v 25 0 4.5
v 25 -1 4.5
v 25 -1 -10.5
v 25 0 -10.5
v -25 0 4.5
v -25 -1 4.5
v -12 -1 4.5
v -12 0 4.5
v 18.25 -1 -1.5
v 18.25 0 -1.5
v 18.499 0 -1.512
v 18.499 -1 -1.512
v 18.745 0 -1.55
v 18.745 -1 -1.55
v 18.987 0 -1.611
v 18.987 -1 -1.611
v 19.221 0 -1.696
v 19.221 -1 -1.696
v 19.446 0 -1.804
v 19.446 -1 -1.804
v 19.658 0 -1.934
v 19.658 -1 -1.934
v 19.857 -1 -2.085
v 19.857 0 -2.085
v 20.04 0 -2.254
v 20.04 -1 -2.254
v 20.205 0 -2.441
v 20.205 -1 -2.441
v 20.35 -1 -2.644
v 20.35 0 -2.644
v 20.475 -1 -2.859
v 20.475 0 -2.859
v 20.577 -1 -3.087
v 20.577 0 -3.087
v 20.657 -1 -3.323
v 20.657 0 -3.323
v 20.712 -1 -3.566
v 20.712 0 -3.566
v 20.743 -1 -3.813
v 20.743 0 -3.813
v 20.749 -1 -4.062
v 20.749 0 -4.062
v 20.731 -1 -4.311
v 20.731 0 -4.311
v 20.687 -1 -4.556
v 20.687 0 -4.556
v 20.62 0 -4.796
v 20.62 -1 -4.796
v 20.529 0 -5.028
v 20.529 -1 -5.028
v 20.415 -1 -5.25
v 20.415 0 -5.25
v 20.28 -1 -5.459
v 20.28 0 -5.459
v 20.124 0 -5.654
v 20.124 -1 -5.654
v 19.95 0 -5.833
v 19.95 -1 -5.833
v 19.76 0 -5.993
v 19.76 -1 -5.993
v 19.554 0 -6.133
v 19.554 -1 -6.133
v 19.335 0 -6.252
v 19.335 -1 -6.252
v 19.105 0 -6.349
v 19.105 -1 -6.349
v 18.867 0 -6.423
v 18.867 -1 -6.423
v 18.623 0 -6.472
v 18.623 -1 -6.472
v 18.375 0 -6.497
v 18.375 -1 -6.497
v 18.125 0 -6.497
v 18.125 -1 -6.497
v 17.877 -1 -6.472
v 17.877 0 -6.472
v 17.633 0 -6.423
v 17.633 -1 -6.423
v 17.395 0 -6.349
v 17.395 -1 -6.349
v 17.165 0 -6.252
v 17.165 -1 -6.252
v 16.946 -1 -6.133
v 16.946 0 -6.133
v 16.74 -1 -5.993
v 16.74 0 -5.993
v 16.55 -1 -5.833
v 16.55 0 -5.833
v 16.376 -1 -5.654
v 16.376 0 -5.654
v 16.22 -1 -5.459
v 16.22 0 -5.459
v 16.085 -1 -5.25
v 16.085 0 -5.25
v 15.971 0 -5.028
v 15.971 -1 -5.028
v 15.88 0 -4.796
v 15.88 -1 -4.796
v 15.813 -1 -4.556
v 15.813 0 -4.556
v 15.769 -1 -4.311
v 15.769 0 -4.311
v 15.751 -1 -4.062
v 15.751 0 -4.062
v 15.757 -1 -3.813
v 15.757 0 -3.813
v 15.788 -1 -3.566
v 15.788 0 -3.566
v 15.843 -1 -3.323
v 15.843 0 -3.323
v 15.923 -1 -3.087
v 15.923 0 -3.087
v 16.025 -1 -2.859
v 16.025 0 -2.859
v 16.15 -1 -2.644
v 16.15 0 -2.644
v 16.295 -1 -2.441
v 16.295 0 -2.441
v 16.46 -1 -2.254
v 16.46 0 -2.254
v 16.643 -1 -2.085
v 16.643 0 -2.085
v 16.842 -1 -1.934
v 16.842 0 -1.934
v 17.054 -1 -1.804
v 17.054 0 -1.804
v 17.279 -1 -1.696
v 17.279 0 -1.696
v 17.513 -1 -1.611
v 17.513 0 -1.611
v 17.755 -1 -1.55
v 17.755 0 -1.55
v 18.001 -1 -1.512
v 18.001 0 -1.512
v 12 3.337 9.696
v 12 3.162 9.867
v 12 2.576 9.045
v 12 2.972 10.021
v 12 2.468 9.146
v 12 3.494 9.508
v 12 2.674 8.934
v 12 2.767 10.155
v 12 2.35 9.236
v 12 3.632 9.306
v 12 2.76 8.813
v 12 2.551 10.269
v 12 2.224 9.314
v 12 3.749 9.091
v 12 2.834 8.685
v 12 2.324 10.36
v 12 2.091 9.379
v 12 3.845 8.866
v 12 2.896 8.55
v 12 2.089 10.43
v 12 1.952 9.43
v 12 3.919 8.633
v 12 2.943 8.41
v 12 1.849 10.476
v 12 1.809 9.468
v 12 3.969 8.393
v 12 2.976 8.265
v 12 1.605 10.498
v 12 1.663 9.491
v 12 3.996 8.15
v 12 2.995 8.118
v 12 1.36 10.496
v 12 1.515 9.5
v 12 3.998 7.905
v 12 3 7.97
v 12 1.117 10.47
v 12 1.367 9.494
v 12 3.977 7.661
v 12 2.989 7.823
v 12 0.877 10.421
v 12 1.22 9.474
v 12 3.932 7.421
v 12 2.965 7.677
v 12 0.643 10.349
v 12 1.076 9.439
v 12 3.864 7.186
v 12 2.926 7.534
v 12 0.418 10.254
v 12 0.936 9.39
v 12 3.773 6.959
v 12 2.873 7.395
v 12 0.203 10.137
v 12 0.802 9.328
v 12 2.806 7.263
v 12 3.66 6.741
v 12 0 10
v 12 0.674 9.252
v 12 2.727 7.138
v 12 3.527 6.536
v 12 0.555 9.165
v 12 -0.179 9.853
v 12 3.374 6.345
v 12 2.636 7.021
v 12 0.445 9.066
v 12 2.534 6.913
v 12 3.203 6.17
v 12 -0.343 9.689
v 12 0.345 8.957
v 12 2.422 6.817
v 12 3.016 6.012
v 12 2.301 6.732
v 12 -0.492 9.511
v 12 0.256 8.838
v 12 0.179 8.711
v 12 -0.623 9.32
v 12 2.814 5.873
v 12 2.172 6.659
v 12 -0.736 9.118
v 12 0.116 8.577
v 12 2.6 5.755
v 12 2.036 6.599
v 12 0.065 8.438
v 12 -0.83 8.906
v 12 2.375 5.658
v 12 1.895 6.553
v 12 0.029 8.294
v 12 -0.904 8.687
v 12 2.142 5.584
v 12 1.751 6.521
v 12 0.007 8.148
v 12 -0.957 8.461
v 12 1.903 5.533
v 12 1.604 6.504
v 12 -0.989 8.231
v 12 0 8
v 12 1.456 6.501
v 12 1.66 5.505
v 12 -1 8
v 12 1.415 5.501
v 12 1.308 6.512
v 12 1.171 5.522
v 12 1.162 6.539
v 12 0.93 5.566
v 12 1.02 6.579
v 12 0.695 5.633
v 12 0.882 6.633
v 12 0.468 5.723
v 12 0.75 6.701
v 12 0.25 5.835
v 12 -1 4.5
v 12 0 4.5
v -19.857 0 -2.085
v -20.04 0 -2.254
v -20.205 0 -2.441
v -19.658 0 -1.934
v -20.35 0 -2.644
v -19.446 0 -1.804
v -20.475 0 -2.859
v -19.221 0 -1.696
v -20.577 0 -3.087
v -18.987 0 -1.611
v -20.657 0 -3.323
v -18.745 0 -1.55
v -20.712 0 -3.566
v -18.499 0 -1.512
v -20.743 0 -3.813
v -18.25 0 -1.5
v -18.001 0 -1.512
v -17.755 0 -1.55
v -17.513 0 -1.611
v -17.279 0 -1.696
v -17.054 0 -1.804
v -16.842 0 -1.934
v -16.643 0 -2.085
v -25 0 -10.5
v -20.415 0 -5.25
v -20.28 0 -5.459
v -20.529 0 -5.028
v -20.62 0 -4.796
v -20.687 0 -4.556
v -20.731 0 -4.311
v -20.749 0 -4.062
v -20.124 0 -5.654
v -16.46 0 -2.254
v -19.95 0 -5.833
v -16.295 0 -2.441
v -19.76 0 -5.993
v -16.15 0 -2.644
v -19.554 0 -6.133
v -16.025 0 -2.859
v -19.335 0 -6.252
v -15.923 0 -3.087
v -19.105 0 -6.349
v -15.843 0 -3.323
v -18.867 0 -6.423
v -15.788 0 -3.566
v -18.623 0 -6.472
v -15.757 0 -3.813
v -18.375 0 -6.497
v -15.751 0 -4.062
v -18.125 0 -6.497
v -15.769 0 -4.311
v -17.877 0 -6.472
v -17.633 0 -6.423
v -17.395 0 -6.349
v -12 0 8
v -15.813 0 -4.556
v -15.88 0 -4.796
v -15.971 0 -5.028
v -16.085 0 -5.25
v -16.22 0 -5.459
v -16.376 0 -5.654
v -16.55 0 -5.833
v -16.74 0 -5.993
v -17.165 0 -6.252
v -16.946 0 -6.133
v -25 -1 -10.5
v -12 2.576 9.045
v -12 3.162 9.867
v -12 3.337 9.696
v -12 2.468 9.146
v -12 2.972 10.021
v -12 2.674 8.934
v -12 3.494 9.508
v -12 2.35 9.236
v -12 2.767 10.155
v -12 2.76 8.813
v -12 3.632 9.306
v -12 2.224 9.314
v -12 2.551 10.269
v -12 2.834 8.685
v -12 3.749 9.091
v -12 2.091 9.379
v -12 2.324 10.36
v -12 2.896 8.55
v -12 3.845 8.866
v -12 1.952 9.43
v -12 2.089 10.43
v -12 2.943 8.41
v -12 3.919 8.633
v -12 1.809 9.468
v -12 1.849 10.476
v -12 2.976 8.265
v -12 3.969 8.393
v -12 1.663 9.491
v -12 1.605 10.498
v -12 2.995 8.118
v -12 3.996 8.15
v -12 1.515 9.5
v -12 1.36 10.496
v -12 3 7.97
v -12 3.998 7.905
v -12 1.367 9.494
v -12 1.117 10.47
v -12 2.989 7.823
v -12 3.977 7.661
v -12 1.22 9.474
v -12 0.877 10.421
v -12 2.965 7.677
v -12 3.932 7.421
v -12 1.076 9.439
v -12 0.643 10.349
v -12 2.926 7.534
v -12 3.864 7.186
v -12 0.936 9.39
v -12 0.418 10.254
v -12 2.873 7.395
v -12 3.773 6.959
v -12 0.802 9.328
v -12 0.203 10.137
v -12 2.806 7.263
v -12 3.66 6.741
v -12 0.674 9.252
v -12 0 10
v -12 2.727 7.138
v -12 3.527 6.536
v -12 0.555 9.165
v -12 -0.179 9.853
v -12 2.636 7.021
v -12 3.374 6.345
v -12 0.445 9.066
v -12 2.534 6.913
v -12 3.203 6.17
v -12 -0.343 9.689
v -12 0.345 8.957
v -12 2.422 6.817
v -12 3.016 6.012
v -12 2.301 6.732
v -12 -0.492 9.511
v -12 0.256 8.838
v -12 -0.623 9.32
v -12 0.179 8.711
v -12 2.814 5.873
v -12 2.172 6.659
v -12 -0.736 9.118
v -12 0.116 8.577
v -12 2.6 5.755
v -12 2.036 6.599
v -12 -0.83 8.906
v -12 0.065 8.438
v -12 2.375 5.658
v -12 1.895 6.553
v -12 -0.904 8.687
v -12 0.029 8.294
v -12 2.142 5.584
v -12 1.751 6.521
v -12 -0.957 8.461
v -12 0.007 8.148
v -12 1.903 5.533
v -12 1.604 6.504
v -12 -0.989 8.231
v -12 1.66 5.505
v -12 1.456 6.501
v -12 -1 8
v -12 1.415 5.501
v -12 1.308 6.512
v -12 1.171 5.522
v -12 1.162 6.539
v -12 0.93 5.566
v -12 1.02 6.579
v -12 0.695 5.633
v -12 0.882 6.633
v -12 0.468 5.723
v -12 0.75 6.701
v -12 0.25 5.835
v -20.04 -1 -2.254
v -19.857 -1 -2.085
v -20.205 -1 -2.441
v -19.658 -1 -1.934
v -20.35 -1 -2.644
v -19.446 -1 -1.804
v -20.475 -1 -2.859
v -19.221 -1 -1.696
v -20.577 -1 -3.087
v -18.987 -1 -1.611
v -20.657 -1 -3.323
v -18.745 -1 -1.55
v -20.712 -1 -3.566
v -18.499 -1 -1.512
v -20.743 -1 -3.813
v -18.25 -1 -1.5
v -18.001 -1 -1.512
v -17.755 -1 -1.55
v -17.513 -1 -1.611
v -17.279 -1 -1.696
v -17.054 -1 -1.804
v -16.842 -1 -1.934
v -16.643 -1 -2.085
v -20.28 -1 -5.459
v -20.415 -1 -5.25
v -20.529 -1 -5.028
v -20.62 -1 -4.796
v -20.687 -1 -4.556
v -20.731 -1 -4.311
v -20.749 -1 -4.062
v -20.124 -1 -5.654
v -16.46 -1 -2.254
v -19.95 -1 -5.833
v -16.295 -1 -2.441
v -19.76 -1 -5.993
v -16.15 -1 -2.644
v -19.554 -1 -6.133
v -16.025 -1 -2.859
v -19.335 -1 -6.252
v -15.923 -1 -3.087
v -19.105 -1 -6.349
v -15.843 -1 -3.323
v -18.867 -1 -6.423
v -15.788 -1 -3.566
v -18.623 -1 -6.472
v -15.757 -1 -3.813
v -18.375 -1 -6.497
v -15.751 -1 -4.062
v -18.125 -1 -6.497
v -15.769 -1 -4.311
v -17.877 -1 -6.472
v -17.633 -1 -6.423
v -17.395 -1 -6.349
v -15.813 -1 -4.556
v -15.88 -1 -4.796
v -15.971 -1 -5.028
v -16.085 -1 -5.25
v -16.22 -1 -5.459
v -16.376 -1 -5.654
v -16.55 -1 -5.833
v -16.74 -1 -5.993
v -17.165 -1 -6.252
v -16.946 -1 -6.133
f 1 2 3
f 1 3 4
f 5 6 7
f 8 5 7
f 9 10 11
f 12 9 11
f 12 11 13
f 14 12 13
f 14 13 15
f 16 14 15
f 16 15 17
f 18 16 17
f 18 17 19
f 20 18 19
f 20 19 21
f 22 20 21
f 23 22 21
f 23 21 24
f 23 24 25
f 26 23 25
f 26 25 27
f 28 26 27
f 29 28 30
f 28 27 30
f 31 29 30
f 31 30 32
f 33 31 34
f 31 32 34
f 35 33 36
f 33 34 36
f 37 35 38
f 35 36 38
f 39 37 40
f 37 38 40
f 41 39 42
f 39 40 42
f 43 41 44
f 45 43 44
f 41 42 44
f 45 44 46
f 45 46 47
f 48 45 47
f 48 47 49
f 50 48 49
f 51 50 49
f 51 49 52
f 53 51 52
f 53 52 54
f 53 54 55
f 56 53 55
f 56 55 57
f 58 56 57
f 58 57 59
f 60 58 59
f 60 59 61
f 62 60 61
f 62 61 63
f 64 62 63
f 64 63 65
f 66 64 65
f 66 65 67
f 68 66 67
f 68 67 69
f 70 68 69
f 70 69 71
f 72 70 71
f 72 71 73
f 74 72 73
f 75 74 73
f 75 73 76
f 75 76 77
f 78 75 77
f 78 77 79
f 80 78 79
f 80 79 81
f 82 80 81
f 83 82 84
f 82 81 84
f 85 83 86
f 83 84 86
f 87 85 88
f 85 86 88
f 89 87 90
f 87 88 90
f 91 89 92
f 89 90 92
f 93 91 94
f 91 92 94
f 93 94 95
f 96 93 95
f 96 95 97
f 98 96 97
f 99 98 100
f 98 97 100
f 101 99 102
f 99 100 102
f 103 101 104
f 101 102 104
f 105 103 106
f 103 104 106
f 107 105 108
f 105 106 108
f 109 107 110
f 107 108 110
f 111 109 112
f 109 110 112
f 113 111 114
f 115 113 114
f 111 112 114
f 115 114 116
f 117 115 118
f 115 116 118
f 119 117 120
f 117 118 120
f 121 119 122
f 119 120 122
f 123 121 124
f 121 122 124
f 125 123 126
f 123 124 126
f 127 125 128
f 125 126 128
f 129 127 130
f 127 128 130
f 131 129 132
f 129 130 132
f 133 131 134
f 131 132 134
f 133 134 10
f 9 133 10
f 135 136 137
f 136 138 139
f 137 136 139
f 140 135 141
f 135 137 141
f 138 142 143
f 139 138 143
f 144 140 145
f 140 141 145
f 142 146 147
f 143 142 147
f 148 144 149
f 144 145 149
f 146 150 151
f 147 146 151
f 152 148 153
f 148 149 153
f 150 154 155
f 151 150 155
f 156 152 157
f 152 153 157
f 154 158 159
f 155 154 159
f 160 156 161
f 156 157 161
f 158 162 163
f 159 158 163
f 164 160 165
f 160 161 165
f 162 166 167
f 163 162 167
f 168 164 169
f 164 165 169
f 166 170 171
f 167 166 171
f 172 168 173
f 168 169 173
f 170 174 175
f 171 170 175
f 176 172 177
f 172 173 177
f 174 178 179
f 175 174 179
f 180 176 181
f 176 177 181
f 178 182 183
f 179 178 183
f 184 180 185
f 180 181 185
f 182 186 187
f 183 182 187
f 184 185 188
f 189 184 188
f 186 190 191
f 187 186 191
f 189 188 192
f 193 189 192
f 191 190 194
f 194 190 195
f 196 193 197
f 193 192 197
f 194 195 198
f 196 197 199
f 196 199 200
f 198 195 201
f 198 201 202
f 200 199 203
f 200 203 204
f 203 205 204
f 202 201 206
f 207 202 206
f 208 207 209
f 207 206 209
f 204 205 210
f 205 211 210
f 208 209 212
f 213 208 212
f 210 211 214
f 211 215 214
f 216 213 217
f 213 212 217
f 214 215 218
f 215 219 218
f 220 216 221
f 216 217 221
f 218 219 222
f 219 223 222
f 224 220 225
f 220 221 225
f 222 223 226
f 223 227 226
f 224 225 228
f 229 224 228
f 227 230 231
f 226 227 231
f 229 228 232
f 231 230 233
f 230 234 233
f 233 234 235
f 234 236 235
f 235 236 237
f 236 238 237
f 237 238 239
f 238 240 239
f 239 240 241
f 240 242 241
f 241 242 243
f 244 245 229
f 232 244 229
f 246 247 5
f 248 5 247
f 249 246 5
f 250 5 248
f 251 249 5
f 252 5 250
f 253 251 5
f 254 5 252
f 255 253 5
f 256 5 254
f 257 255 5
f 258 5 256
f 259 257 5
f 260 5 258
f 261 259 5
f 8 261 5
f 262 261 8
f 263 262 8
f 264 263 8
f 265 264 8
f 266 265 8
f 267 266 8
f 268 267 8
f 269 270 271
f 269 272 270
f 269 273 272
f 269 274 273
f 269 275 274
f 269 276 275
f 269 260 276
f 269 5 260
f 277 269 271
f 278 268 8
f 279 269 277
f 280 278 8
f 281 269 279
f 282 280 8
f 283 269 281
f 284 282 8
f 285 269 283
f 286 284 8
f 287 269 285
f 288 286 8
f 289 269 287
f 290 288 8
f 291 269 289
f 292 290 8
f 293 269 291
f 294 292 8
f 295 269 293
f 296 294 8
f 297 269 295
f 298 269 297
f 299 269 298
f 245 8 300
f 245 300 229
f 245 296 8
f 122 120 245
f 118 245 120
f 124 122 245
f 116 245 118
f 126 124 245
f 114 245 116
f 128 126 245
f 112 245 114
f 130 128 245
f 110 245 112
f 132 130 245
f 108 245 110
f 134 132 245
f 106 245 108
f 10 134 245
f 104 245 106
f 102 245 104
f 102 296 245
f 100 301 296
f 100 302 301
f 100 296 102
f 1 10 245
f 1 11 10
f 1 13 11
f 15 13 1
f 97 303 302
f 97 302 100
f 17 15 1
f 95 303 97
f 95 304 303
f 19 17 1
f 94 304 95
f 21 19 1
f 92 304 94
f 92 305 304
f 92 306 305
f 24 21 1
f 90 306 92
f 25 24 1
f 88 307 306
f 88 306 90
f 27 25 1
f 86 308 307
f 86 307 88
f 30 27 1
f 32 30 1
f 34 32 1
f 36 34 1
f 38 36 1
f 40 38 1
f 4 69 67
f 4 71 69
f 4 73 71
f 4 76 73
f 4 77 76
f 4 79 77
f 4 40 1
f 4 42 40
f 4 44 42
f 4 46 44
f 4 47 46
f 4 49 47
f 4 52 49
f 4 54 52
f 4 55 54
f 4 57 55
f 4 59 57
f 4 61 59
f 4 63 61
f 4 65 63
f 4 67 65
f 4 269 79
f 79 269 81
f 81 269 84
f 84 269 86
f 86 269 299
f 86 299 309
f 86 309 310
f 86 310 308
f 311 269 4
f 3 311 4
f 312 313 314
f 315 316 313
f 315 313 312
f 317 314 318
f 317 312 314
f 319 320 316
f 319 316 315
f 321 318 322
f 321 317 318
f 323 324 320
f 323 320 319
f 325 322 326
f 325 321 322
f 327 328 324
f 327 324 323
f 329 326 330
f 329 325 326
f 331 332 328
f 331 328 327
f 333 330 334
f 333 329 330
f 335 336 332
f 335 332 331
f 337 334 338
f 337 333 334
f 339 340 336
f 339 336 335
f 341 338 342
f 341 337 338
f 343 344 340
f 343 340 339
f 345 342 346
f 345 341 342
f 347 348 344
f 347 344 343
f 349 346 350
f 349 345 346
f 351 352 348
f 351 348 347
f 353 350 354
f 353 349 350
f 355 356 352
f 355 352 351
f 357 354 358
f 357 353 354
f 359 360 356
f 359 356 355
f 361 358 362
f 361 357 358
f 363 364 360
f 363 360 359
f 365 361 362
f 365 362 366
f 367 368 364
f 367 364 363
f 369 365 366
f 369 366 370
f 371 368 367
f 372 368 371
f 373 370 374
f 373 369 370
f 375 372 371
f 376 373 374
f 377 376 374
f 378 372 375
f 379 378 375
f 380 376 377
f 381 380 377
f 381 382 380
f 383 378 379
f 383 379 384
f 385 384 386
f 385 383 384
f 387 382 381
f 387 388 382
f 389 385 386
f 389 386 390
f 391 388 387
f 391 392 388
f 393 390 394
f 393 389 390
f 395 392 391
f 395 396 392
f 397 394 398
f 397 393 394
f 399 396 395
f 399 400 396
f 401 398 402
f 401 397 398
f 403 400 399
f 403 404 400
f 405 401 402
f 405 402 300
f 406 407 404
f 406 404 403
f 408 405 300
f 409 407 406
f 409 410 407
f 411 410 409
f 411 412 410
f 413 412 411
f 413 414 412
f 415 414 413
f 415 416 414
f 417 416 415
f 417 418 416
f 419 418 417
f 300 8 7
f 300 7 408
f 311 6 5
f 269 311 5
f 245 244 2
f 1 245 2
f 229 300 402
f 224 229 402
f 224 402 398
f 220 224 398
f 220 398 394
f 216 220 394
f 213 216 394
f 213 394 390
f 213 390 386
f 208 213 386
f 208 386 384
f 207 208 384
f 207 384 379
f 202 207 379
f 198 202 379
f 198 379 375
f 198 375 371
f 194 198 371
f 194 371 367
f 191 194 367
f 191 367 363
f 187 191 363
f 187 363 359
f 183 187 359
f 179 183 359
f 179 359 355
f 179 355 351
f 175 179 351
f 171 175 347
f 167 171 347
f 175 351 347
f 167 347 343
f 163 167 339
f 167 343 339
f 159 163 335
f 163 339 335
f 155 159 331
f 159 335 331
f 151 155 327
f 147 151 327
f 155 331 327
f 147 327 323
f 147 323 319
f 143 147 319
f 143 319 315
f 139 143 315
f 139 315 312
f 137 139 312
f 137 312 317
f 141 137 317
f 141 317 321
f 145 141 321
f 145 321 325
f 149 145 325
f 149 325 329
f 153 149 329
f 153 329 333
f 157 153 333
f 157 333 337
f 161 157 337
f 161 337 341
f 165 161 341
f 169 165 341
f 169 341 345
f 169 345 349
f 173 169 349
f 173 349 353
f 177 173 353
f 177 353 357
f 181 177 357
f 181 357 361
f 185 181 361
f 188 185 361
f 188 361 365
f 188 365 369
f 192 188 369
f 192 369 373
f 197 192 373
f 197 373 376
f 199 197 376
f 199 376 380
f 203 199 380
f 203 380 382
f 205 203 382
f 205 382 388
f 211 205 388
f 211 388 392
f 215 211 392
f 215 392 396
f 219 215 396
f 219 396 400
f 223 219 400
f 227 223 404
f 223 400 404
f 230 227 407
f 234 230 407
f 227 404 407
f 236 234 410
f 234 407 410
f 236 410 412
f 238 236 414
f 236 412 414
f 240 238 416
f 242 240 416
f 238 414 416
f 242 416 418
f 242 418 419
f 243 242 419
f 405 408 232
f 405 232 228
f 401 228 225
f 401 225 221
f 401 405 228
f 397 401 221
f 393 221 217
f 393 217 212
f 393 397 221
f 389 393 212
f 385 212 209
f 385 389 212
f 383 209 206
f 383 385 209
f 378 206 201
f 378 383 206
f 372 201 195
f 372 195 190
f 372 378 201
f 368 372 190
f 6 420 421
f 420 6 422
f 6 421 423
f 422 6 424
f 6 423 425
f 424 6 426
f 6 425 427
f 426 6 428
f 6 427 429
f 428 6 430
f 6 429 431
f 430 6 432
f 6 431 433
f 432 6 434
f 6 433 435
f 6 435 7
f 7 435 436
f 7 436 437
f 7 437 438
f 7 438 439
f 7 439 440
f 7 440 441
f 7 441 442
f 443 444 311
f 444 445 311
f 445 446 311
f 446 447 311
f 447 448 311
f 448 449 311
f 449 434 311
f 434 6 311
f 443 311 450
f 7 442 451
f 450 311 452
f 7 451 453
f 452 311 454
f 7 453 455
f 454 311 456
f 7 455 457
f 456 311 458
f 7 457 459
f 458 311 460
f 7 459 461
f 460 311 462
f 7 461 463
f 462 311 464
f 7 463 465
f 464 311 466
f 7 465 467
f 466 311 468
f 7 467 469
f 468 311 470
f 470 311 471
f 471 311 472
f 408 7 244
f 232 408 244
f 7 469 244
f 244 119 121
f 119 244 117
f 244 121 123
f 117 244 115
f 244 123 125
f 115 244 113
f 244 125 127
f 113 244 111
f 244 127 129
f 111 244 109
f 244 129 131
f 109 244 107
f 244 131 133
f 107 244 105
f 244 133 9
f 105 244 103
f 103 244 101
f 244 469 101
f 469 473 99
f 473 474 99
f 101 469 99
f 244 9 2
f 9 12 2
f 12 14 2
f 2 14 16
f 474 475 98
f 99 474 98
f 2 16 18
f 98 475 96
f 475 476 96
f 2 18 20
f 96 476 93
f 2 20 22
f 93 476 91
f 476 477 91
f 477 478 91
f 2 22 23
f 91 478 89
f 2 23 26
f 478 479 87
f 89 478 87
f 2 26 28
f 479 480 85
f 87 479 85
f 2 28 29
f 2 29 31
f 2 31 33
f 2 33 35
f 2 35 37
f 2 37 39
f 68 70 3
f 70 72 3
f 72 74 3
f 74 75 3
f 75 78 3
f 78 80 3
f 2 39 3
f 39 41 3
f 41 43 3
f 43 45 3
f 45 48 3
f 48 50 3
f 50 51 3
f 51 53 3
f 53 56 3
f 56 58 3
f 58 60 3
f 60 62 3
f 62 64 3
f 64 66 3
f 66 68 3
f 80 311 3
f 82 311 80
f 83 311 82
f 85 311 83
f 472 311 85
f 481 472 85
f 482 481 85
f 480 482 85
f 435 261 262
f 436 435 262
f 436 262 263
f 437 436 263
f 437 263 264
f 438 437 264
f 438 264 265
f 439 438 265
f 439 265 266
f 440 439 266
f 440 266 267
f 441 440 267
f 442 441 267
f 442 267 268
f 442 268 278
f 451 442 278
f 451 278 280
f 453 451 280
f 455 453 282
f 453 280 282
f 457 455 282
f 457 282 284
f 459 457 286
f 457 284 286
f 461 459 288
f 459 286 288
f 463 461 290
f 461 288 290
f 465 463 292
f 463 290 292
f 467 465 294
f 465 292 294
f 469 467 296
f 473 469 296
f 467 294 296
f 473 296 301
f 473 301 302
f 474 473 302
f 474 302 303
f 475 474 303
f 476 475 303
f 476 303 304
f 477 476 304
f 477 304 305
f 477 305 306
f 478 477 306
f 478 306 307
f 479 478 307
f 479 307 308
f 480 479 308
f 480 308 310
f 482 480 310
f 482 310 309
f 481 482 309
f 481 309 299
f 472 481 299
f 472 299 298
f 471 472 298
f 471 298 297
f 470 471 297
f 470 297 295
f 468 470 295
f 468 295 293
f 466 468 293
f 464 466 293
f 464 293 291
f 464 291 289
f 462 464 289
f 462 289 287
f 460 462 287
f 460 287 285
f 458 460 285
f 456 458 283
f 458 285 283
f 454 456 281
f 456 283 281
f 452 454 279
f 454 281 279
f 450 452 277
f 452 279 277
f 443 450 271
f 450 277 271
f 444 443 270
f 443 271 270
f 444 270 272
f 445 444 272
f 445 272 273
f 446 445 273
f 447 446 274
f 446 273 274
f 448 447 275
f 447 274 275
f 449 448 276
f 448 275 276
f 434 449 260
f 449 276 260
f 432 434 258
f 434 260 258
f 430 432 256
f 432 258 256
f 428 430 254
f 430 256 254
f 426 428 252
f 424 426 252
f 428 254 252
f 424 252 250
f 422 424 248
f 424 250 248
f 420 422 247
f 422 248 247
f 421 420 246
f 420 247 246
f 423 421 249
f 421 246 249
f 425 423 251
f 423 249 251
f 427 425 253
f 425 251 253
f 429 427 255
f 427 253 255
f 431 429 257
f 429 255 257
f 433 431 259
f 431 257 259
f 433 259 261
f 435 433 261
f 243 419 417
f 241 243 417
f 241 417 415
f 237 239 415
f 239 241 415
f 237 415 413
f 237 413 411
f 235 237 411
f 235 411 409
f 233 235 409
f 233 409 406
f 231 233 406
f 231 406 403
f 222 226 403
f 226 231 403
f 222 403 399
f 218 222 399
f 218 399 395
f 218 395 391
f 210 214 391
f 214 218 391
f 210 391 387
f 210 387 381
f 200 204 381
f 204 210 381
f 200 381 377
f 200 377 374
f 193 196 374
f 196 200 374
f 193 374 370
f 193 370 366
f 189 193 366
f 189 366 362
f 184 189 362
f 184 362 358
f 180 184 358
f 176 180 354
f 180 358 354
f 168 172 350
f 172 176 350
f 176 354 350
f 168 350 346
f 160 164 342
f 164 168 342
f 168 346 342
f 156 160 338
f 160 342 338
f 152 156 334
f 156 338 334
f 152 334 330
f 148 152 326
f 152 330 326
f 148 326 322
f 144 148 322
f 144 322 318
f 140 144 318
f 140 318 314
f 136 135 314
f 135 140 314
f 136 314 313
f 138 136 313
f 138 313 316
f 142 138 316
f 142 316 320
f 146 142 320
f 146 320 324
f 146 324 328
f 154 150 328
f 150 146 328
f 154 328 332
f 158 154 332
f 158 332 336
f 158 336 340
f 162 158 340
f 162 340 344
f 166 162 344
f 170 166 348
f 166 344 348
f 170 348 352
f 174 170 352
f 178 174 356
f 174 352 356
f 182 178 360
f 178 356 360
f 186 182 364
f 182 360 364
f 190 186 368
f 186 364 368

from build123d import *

# Parameters (mm, degrees)
SKETCH2_W               = 50
SKETCH2_H               = 21
BASE_FLANGE1_DEPTH      = 1
HEM1_START              = -25
HEM1_DEPTH              = 50
HEM1_2_DEPTH            = 50
CUT_EXTRUDE1_DEPTH      = 28.408940147
CUT_EXTRUDE1_DEPTH_BACK = 28.408940147
SKETCH5_W               = 13
SKETCH5_H               = 6
SKETCH6_R               = 2.5
CUT_EXTRUDE2_DEPTH      = 28.408940147


# Read off the part's stored shape, not the designer's step: Hem1
# Sheet-metal steps are written as plain solids
with BuildPart() as part:
    # Sketch2 → Base-Flange1 (new body)
    with BuildSketch(Plane(origin=(0, 0, 0), x_dir=(1, 0, 0), z_dir=(0, 1, 0))):
        Rectangle(SKETCH2_W, SKETCH2_H)
    extrude(amount=-BASE_FLANGE1_DEPTH)

    # Hem1 outline → Hem1 (cut)
    with BuildSketch(Plane.YZ.offset(HEM1_START)):
        with BuildLine():
            ThreePointArc((-1, 8), (-0.736067978, 9.118033989), (0, 10))
            Line((0, 10), (0, 10.5))
            Line((0, 10.5), (-1, 10.5))
            Line((-1, 10.5), (-1, 8))
        make_face()
    extrude(amount=HEM1_DEPTH, mode=Mode.SUBTRACT)

    # Hem1 2 outline → Hem1 2 (add)
    with BuildSketch(Plane.YZ.offset(HEM1_START)):
        with BuildLine():
            Line((0.75, 6.700961894), (0.25, 5.834936491))
            ThreePointArc((0.25, 5.834936491), (3.995508667, 8.149788152), (0, 10))
            Line((0, 10), (0, 8))
            ThreePointArc((0, 8), (2.799038106, 8.75), (0.75, 6.700961894))
        make_face()
    extrude(amount=HEM1_2_DEPTH)

    # Sketch5 → Cut-Extrude1 (cut, two sides: drawn at the far end of the back side and taken through both)
    with BuildSketch(Plane(origin=(0, 0, 0), x_dir=(1, 0, 0), z_dir=(0, 1, 0)).offset(-CUT_EXTRUDE1_DEPTH_BACK)):
        with Locations((18.5, -7.5)):
            Rectangle(SKETCH5_W, SKETCH5_H)
        with Locations((-18.5, -7.5)):
            Rectangle(SKETCH5_W, SKETCH5_H)
    extrude(amount=CUT_EXTRUDE1_DEPTH + CUT_EXTRUDE1_DEPTH_BACK, mode=Mode.SUBTRACT)

    # Sketch6 → Cut-Extrude2 (cut, through all)
    with BuildSketch(Plane(origin=(0, 0, 0), x_dir=(1, 0, 0), z_dir=(0, 1, 0))):
        with Locations(Location((18.25, 4, 0), (0, 0, 270))):
            Circle(SKETCH6_R)
        with Locations(Location((-18.25, 4, 0), (0, 0, 270))):
            Circle(SKETCH6_R)
    extrude(amount=-CUT_EXTRUDE2_DEPTH, mode=Mode.SUBTRACT)


solid = part.part
